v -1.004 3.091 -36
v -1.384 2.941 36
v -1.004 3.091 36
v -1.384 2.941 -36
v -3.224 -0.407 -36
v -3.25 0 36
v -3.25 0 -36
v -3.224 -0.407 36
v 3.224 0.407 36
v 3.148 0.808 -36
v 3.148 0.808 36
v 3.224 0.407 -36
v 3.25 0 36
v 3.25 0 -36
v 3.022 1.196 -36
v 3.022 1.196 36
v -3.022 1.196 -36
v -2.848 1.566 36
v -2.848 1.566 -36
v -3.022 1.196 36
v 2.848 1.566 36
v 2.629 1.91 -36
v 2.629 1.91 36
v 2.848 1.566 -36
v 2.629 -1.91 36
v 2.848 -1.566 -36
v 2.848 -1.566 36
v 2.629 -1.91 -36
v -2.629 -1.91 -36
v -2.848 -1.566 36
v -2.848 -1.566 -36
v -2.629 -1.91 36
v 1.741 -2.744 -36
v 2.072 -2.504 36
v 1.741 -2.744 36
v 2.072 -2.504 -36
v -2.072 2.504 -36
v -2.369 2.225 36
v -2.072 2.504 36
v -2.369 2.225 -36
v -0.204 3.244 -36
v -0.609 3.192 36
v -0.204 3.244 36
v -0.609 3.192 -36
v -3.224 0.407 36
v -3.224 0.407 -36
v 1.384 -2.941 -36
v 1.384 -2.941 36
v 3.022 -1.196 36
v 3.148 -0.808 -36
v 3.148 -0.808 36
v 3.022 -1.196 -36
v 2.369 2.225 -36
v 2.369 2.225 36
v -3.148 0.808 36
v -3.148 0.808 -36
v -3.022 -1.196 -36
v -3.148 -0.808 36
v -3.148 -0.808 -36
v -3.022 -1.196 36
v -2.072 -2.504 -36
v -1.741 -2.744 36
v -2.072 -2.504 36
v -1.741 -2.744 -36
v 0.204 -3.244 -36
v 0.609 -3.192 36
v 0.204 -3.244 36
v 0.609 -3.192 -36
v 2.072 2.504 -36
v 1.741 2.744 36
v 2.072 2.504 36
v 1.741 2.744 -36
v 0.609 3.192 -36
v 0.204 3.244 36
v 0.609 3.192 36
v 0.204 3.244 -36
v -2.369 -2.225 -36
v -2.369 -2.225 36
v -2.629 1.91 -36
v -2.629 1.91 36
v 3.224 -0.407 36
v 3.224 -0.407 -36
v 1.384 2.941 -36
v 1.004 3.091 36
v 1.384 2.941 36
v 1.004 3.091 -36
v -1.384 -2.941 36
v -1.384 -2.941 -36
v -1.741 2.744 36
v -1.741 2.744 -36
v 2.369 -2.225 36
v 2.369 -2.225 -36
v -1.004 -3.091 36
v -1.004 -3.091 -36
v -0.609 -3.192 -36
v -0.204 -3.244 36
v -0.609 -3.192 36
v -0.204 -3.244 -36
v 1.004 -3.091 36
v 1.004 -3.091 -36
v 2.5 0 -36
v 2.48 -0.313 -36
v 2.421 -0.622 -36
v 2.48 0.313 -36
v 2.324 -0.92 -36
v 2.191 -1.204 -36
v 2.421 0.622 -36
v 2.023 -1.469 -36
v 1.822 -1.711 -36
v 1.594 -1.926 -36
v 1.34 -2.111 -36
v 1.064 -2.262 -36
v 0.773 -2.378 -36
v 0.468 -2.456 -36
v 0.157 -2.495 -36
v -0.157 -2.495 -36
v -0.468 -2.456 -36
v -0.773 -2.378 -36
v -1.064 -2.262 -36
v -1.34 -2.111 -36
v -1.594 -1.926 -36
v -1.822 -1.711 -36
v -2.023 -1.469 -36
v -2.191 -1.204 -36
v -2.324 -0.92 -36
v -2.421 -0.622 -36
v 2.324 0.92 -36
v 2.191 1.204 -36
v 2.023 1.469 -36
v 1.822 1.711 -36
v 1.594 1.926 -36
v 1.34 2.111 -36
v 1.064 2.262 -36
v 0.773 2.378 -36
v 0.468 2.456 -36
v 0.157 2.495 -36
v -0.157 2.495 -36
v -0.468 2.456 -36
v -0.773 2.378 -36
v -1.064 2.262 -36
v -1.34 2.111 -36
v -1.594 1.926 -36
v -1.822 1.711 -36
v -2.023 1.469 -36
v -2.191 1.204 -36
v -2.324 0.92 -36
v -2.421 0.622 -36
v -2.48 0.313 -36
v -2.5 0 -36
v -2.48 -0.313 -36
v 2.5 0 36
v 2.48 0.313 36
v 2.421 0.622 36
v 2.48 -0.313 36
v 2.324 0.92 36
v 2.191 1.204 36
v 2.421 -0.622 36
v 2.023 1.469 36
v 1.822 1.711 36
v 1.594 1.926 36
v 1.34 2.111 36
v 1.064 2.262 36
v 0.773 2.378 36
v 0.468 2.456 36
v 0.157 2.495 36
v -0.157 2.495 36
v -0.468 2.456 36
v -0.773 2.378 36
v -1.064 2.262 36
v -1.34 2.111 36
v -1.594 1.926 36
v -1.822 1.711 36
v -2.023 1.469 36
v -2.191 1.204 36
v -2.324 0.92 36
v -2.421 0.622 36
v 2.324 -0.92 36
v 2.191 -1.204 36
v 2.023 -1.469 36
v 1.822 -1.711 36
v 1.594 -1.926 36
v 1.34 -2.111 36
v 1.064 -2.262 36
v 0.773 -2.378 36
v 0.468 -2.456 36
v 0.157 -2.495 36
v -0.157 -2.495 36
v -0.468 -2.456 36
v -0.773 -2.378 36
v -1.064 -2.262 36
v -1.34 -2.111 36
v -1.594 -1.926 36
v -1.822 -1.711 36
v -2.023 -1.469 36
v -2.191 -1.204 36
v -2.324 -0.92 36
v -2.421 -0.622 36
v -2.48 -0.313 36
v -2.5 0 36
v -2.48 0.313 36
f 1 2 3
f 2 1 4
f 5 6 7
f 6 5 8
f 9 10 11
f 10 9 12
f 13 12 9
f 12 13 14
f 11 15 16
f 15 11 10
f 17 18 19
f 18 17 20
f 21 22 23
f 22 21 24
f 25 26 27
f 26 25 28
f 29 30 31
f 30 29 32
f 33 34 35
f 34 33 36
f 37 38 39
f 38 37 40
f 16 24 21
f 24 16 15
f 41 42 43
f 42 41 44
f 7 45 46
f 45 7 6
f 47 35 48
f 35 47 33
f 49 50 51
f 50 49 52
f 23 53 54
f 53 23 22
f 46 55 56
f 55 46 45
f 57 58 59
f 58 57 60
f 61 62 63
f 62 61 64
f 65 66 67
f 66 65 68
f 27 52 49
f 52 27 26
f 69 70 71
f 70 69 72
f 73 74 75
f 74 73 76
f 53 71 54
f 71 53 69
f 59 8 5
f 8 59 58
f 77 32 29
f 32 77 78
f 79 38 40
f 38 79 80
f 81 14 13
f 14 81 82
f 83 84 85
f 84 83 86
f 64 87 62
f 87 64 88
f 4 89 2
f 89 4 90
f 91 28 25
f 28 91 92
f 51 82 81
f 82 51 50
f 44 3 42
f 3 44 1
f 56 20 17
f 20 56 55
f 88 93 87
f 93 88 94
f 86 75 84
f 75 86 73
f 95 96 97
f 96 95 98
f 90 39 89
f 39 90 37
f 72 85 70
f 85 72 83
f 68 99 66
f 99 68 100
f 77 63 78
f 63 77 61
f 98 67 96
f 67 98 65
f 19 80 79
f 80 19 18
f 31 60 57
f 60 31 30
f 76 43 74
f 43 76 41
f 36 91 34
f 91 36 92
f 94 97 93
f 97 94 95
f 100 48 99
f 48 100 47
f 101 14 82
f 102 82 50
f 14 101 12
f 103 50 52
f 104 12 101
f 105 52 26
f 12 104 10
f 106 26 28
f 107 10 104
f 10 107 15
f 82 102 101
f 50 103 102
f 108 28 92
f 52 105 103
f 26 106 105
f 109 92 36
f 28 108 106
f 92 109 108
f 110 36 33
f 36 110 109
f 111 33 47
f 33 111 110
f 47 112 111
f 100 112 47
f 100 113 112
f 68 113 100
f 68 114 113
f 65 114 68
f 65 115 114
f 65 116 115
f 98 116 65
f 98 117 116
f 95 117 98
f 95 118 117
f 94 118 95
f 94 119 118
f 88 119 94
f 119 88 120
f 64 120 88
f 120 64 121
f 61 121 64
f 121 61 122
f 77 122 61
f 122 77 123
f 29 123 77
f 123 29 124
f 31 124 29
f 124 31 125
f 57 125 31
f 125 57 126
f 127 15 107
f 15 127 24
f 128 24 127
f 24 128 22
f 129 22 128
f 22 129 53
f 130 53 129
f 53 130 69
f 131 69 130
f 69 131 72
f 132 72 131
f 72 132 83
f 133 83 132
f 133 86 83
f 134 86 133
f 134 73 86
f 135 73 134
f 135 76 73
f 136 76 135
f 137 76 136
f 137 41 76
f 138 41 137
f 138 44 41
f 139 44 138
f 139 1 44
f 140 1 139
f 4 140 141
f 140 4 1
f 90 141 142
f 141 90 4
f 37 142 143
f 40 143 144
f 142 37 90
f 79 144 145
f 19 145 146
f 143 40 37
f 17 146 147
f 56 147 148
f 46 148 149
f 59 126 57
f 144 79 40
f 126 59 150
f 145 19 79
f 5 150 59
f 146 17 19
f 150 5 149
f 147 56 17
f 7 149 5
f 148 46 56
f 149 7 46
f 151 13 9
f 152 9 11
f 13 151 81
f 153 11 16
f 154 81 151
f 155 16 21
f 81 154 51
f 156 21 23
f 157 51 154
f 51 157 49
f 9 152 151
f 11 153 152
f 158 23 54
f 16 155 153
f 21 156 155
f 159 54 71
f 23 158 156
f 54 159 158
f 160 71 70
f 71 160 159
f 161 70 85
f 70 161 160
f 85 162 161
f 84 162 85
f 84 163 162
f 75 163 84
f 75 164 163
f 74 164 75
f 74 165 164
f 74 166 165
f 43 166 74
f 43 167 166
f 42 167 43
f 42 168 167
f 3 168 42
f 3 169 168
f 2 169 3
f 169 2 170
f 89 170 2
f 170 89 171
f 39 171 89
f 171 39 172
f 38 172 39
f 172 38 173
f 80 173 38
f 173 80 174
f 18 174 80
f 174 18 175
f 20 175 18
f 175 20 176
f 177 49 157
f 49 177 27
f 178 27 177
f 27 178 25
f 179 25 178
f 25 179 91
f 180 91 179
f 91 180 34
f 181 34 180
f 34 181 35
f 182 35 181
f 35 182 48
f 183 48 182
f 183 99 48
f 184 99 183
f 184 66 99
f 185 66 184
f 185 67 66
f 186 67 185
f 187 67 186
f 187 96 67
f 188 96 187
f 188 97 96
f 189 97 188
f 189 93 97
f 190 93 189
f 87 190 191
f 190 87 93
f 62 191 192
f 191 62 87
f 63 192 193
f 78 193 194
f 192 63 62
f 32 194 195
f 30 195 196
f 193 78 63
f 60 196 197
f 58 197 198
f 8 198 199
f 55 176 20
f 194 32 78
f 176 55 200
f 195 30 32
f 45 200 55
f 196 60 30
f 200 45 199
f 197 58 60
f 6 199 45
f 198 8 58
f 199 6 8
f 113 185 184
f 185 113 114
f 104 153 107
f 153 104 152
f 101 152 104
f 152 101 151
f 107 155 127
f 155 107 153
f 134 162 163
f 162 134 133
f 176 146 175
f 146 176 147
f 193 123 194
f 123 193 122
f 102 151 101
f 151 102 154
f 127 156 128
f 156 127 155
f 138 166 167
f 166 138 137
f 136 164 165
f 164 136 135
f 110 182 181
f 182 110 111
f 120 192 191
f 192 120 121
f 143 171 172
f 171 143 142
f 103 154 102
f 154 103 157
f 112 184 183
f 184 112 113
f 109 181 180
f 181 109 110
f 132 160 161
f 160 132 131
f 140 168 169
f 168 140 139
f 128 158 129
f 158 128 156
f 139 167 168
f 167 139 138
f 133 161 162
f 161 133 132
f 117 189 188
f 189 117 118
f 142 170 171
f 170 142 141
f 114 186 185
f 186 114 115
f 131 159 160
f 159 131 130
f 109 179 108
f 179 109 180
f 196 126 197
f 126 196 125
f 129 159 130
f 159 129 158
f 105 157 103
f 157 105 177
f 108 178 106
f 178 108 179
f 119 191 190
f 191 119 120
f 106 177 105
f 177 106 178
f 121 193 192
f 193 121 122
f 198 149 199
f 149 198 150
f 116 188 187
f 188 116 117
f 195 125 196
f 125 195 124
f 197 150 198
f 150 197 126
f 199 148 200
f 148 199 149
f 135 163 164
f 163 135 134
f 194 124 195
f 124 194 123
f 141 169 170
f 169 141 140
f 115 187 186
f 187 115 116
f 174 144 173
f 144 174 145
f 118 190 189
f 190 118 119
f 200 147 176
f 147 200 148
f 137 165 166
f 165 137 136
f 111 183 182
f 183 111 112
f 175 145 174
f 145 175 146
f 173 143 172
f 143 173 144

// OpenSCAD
$fn = 50;


difference() {
	union() {
		translate(v = [0, 0, -36.0000000000]) {
			cylinder(h = 72, r = 3.2500000000);
		}
	}
	union() {
		translate(v = [0, 0, -100.0000000000]) {
			cylinder(h = 200, r = 2.5000000000);
		}
	}
}
